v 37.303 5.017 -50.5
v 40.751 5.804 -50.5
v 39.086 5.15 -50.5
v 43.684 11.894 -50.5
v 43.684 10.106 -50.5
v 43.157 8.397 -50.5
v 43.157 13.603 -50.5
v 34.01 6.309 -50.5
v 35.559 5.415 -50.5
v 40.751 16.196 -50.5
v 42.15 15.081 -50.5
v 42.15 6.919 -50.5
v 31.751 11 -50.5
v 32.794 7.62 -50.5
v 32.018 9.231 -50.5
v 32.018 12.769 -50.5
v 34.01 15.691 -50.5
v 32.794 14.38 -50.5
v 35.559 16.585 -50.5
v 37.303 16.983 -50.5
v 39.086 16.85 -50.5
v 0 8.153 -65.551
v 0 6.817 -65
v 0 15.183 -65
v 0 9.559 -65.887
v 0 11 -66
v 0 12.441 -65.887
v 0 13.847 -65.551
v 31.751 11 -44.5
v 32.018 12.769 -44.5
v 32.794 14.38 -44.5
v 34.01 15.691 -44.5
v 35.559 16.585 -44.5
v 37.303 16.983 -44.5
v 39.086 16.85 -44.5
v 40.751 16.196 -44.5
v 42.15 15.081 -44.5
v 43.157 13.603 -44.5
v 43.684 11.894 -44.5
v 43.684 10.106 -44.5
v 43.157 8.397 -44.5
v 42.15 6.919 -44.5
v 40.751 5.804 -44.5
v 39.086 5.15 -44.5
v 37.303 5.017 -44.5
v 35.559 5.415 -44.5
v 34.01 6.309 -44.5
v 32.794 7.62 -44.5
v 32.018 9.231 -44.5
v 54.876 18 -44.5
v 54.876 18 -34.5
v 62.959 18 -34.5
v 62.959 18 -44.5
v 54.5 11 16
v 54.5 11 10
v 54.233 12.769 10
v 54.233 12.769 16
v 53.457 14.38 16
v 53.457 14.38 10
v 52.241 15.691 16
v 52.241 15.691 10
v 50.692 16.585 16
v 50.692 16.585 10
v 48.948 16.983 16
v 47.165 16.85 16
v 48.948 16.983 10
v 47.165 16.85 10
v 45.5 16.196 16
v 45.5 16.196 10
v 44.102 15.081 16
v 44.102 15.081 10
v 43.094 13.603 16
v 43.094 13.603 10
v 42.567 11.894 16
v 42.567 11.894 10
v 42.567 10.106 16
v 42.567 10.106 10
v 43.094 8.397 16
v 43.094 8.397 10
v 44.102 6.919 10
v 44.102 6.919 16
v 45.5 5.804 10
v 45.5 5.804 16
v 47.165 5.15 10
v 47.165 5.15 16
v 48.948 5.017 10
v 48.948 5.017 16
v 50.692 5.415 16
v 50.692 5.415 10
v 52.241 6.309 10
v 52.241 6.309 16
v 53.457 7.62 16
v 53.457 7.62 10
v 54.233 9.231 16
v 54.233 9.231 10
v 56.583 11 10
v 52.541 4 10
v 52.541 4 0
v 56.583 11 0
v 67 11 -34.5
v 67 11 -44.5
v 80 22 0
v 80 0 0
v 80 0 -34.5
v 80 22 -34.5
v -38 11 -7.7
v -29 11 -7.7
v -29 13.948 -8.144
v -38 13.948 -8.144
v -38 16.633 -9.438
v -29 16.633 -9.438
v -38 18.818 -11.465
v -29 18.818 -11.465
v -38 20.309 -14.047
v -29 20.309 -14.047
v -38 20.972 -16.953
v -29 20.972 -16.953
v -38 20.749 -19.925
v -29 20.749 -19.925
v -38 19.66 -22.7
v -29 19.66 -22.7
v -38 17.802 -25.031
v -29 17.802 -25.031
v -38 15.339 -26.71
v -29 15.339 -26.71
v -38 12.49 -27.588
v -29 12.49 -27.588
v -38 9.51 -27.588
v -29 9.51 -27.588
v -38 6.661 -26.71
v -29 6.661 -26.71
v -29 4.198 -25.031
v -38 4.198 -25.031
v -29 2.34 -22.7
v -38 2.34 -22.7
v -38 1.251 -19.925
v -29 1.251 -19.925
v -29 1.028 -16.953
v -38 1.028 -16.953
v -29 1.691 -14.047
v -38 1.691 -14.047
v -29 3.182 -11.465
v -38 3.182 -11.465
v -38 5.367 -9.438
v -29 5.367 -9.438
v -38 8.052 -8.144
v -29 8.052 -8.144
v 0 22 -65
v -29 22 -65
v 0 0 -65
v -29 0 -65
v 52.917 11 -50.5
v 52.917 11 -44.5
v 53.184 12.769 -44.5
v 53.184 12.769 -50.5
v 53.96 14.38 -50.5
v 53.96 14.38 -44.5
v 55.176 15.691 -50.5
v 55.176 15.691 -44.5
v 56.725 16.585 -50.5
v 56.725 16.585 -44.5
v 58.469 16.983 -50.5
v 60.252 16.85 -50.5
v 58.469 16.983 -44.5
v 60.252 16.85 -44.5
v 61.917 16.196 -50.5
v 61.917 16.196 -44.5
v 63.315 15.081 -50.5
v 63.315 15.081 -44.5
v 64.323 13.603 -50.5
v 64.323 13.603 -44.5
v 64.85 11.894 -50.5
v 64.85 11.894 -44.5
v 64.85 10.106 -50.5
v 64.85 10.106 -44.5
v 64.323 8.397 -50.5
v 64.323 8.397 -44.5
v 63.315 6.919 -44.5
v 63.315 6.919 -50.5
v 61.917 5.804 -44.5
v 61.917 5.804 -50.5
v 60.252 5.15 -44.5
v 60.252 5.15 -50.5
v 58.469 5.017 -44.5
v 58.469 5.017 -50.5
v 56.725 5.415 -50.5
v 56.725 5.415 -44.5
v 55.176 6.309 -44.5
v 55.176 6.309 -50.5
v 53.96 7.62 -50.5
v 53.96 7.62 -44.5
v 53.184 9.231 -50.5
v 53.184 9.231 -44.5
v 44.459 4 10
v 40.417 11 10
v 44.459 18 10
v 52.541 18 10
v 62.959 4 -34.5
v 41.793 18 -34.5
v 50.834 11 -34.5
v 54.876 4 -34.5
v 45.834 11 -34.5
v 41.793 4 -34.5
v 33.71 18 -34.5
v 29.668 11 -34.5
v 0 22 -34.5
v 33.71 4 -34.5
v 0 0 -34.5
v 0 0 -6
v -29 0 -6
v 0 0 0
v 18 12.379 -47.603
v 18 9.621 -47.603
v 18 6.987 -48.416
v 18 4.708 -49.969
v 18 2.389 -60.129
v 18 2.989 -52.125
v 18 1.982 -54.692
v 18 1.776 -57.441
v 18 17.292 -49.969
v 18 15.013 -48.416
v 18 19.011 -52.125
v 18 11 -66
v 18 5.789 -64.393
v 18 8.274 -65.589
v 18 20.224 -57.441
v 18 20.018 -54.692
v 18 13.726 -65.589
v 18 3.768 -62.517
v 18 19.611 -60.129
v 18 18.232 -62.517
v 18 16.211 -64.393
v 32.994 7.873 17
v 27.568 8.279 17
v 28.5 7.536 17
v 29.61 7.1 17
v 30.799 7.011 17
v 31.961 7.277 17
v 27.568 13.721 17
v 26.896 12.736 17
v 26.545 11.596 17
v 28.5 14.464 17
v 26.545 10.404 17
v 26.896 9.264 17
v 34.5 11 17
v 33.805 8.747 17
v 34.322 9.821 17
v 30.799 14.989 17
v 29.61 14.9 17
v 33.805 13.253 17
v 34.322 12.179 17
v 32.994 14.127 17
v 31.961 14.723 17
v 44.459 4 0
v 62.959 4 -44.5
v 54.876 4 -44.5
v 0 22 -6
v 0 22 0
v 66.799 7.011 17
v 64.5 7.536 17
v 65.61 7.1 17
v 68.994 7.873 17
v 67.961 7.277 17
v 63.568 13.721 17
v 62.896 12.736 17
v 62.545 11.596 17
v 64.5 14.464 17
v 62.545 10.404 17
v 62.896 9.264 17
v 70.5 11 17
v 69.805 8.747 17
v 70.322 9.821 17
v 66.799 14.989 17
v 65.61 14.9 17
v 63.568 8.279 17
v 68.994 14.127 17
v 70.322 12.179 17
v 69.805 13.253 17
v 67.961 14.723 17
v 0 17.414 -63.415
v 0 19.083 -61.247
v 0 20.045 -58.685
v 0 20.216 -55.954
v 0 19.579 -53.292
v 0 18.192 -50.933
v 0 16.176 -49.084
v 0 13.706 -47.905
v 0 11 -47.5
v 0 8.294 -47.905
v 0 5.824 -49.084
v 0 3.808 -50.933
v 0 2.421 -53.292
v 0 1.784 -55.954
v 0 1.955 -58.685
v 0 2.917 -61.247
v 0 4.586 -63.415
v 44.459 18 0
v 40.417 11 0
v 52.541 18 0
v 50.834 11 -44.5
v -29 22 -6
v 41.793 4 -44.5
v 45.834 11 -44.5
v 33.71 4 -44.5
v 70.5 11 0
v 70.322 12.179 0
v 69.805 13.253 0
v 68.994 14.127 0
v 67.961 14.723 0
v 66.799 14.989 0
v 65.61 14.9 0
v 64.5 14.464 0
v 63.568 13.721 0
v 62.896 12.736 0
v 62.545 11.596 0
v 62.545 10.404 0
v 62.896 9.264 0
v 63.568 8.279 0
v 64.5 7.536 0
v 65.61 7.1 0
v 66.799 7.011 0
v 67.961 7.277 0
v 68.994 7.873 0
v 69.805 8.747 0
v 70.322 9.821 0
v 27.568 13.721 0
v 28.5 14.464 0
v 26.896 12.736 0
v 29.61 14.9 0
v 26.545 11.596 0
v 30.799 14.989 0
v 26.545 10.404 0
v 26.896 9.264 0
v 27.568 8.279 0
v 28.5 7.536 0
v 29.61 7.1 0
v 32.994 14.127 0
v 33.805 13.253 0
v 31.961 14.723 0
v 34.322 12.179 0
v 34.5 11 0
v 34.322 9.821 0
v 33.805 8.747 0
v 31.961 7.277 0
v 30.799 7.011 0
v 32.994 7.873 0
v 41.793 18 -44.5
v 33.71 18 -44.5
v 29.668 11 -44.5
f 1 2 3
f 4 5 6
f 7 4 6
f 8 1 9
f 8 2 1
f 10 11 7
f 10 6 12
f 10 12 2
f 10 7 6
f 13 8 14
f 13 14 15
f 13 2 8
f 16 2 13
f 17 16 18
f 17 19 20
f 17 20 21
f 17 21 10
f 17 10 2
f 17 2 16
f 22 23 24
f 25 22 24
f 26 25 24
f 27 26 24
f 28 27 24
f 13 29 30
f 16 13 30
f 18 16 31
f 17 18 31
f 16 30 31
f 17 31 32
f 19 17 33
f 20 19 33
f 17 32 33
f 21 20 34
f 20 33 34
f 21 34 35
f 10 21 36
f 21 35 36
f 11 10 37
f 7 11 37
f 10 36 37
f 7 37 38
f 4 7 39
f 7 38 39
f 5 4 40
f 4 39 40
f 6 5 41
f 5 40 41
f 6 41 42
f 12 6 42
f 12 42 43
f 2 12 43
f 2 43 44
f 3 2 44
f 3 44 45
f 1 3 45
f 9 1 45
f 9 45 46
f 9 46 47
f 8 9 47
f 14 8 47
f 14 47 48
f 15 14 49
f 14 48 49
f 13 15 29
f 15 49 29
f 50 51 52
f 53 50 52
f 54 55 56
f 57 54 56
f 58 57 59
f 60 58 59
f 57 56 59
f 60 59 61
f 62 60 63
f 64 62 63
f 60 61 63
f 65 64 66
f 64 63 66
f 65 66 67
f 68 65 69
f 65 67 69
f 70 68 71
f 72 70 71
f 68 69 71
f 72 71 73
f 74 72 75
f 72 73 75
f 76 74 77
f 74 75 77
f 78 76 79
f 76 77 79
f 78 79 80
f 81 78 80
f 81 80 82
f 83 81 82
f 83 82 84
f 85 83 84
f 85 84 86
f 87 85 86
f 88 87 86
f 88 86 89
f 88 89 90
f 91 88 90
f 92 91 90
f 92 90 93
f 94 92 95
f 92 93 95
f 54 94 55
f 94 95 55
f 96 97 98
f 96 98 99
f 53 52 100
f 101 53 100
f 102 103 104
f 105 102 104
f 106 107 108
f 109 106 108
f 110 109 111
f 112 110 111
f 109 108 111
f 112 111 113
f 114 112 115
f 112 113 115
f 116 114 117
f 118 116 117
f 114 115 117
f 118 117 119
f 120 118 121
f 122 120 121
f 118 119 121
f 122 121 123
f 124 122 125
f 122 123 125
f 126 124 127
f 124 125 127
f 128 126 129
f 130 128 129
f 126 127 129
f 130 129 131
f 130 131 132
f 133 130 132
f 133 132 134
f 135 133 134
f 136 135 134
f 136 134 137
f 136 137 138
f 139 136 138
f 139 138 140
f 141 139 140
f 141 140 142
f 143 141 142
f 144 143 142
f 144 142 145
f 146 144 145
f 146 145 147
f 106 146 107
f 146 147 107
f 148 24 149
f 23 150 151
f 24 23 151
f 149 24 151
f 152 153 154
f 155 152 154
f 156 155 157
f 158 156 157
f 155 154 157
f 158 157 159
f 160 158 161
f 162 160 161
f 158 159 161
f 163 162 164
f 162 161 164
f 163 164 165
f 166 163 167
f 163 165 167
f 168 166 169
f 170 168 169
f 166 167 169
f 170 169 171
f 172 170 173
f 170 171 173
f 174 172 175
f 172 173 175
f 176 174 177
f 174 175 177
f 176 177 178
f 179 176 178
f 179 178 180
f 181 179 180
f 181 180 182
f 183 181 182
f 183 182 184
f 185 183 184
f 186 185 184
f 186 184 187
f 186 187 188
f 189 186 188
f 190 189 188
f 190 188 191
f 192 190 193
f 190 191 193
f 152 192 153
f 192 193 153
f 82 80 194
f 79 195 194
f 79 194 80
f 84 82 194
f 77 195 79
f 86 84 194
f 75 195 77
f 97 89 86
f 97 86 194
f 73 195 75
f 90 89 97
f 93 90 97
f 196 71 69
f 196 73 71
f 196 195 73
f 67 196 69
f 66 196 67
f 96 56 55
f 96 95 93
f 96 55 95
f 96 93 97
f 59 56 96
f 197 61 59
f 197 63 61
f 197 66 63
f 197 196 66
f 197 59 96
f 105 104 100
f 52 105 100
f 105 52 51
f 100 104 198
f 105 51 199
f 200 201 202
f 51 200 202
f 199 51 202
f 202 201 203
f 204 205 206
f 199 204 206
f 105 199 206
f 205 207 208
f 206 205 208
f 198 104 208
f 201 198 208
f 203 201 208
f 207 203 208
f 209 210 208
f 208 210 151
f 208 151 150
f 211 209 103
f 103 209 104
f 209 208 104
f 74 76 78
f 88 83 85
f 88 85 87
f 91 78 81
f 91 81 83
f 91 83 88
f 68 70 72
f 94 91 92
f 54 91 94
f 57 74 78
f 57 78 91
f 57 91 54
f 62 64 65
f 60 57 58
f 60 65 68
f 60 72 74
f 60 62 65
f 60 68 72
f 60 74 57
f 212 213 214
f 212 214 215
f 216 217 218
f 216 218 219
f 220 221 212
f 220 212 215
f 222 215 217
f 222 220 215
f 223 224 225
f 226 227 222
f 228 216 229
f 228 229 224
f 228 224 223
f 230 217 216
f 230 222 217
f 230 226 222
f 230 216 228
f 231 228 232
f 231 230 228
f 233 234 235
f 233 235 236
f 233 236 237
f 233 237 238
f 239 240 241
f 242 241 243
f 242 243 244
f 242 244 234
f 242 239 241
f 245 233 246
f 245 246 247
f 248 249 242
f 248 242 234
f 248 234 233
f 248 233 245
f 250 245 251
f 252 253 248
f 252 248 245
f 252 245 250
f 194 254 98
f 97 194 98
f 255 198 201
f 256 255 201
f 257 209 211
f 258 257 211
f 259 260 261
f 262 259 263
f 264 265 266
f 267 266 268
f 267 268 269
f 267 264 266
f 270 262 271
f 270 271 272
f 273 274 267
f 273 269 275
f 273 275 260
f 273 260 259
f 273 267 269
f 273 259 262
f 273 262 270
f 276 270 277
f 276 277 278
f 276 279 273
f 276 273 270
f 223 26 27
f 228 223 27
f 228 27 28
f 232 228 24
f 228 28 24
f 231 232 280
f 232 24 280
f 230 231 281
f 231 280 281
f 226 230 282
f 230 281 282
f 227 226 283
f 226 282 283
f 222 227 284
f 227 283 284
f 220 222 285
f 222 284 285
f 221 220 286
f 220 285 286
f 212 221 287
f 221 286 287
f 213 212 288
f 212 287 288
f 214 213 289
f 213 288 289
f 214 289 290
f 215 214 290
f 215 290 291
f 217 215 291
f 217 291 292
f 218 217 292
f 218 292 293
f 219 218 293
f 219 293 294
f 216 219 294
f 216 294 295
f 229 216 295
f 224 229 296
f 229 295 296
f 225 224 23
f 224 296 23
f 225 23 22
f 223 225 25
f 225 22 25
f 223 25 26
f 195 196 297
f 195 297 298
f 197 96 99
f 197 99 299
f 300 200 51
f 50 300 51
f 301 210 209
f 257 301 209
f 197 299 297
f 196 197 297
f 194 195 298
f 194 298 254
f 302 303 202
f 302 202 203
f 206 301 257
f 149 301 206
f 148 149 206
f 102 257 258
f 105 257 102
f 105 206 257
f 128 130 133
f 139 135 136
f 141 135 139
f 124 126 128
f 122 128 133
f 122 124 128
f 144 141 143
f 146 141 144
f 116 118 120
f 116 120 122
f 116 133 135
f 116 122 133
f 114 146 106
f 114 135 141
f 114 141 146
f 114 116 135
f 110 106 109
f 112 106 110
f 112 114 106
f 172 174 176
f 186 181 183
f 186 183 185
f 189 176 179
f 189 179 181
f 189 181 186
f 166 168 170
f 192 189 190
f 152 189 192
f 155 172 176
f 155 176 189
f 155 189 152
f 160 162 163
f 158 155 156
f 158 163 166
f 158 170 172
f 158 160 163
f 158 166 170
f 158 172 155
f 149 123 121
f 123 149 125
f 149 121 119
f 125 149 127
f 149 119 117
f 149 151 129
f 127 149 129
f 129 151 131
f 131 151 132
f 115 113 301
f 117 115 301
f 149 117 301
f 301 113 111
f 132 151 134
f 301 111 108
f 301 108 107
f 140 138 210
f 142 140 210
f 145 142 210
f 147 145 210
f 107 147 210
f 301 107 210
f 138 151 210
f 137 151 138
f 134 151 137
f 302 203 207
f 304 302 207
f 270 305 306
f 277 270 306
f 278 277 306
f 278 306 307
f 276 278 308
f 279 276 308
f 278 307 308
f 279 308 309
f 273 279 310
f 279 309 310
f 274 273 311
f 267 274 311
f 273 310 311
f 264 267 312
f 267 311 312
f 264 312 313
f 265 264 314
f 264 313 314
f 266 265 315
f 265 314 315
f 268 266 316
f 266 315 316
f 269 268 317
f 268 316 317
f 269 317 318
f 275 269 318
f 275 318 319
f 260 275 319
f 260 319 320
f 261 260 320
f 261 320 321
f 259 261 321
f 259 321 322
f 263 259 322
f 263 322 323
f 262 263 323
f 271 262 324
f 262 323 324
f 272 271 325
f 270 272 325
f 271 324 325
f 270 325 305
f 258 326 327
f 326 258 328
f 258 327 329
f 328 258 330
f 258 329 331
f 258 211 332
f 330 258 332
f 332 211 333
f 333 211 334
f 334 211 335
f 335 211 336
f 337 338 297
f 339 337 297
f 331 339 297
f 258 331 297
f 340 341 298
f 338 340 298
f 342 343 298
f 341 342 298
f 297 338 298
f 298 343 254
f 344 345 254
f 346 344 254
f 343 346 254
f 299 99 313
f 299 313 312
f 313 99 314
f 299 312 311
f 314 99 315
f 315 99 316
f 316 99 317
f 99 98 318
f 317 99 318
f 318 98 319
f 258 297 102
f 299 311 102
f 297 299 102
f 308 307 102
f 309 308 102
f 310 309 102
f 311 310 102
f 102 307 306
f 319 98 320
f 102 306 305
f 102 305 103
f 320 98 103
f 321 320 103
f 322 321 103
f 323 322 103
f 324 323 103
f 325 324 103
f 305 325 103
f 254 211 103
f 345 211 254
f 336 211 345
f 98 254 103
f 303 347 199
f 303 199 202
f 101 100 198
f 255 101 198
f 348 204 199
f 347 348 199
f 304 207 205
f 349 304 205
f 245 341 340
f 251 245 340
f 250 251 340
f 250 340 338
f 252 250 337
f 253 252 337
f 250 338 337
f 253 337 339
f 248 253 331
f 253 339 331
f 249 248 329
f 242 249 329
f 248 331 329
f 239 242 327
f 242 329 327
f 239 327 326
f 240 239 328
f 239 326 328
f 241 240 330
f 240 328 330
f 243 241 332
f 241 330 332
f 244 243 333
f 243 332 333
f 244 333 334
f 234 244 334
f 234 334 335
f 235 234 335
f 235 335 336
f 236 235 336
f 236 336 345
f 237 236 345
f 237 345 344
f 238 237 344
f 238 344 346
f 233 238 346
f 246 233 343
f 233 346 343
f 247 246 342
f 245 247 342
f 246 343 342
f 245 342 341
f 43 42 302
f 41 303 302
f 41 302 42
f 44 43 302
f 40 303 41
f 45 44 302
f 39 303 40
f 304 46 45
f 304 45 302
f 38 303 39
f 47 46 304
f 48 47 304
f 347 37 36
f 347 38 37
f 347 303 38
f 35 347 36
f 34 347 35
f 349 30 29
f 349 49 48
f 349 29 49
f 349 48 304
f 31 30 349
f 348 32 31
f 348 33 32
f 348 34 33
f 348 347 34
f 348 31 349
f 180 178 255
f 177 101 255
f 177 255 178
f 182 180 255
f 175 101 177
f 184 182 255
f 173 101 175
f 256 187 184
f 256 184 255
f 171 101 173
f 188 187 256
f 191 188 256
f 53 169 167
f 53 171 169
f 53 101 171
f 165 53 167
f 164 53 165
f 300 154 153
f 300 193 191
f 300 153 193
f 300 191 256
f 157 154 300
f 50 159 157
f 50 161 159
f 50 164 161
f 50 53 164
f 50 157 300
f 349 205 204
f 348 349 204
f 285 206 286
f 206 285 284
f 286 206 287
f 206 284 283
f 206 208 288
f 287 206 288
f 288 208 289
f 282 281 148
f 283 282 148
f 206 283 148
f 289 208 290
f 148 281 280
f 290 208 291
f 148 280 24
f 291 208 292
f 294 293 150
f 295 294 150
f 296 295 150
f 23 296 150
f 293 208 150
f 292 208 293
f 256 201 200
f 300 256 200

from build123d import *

# Parameters (mm, degrees)
BOSS_EXTRUDE1_DEPTH = 22
SKETCH2_R           = 4
BOSS_EXTRUDE2_DEPTH = 17
BOSS_EXTRUDE3_DEPTH = 10
SKETCH4_R           = 9.25
BOSS_EXTRUDE4_DEPTH = 18
SKETCH5_R           = 10
BOSS_EXTRUDE5_DEPTH = 9
BOSS_EXTRUDE6_DEPTH = 10
SKETCH7_R           = 6
BOSS_EXTRUDE7_DEPTH = 6
SKETCH8_R           = 6
BOSS_EXTRUDE8_DEPTH = 6


with BuildPart() as part:
    # Sketch1 → Boss-Extrude1 (new body)
    with BuildSketch(Plane(origin=(0, 0, 0), x_dir=(1, 0, 0), z_dir=(0, 1, 0))):
        Polygon((0, 0), (80, 0), (80, 34.5), (0, 34.5), (0, 65), (-29, 65), (-29, 6), (0, 6), align=None)
    extrude(amount=BOSS_EXTRUDE1_DEPTH)

    # Sketch2 → Boss-Extrude2 (add)
    with BuildSketch(Plane.XY):
        with Locations((30.5, 11)):
            Circle(SKETCH2_R)
        with Locations((66.5, 11)):
            Circle(SKETCH2_R)
    extrude(amount=BOSS_EXTRUDE2_DEPTH)

    # Sketch3 → Boss-Extrude3 (add)
    with BuildSketch(Plane(origin=(0, 0, -34.5), x_dir=(-1, 0, 0), z_dir=(0, 0, -1))):
        Polygon((-50.834192463, 11), (-54.875644347, 18), (-62.958548116, 18), (-67, 11), (-62.958548116, 4), (-54.875644347, 4), align=None)
        Polygon((-29.668384925, 11), (-33.70983681, 18), (-41.792740578, 18), (-45.834192463, 11), (-41.792740578, 4), (-33.70983681, 4), align=None)
    extrude(amount=BOSS_EXTRUDE3_DEPTH)

    # Sketch4 → Boss-Extrude4 (add)
    with BuildSketch(Plane(origin=(0, 0, 0), x_dir=(0, 0, -1), z_dir=(1, 0, 0))):
        with Locations((56.75, 11)):
            Circle(SKETCH4_R)
    extrude(amount=BOSS_EXTRUDE4_DEPTH)

    # Sketch5 → Boss-Extrude5 (add)
    with BuildSketch(Plane.ZY.offset(29)):
        with Locations((-17.7, 11)):
            Circle(SKETCH5_R)
    extrude(amount=BOSS_EXTRUDE5_DEPTH)

    # Sketch6 → Boss-Extrude6 (add)
    with BuildSketch(Plane.XY):
        Polygon((56.582903769, 11), (52.541451884, 18), (44.458548116, 18), (40.417096231, 11), (44.458548116, 4), (52.541451884, 4), align=None)
    extrude(amount=BOSS_EXTRUDE6_DEPTH)

    # Sketch7 → Boss-Extrude7 (add)
    with BuildSketch(Plane.XY.offset(10)):
        with Locations((48.5, 11)):
            Circle(SKETCH7_R)
    extrude(amount=BOSS_EXTRUDE7_DEPTH)

    # Sketch8 → Boss-Extrude8 (add)
    with BuildSketch(Plane(origin=(0, 0, -44.5), x_dir=(-1, 0, 0), z_dir=(0, 0, -1))):
        with Locations((-58.917096231, 11)):
            Circle(SKETCH8_R)
        with Locations((-37.751288694, 11)):
            Circle(SKETCH8_R)
    extrude(amount=BOSS_EXTRUDE8_DEPTH)


solid = part.part
